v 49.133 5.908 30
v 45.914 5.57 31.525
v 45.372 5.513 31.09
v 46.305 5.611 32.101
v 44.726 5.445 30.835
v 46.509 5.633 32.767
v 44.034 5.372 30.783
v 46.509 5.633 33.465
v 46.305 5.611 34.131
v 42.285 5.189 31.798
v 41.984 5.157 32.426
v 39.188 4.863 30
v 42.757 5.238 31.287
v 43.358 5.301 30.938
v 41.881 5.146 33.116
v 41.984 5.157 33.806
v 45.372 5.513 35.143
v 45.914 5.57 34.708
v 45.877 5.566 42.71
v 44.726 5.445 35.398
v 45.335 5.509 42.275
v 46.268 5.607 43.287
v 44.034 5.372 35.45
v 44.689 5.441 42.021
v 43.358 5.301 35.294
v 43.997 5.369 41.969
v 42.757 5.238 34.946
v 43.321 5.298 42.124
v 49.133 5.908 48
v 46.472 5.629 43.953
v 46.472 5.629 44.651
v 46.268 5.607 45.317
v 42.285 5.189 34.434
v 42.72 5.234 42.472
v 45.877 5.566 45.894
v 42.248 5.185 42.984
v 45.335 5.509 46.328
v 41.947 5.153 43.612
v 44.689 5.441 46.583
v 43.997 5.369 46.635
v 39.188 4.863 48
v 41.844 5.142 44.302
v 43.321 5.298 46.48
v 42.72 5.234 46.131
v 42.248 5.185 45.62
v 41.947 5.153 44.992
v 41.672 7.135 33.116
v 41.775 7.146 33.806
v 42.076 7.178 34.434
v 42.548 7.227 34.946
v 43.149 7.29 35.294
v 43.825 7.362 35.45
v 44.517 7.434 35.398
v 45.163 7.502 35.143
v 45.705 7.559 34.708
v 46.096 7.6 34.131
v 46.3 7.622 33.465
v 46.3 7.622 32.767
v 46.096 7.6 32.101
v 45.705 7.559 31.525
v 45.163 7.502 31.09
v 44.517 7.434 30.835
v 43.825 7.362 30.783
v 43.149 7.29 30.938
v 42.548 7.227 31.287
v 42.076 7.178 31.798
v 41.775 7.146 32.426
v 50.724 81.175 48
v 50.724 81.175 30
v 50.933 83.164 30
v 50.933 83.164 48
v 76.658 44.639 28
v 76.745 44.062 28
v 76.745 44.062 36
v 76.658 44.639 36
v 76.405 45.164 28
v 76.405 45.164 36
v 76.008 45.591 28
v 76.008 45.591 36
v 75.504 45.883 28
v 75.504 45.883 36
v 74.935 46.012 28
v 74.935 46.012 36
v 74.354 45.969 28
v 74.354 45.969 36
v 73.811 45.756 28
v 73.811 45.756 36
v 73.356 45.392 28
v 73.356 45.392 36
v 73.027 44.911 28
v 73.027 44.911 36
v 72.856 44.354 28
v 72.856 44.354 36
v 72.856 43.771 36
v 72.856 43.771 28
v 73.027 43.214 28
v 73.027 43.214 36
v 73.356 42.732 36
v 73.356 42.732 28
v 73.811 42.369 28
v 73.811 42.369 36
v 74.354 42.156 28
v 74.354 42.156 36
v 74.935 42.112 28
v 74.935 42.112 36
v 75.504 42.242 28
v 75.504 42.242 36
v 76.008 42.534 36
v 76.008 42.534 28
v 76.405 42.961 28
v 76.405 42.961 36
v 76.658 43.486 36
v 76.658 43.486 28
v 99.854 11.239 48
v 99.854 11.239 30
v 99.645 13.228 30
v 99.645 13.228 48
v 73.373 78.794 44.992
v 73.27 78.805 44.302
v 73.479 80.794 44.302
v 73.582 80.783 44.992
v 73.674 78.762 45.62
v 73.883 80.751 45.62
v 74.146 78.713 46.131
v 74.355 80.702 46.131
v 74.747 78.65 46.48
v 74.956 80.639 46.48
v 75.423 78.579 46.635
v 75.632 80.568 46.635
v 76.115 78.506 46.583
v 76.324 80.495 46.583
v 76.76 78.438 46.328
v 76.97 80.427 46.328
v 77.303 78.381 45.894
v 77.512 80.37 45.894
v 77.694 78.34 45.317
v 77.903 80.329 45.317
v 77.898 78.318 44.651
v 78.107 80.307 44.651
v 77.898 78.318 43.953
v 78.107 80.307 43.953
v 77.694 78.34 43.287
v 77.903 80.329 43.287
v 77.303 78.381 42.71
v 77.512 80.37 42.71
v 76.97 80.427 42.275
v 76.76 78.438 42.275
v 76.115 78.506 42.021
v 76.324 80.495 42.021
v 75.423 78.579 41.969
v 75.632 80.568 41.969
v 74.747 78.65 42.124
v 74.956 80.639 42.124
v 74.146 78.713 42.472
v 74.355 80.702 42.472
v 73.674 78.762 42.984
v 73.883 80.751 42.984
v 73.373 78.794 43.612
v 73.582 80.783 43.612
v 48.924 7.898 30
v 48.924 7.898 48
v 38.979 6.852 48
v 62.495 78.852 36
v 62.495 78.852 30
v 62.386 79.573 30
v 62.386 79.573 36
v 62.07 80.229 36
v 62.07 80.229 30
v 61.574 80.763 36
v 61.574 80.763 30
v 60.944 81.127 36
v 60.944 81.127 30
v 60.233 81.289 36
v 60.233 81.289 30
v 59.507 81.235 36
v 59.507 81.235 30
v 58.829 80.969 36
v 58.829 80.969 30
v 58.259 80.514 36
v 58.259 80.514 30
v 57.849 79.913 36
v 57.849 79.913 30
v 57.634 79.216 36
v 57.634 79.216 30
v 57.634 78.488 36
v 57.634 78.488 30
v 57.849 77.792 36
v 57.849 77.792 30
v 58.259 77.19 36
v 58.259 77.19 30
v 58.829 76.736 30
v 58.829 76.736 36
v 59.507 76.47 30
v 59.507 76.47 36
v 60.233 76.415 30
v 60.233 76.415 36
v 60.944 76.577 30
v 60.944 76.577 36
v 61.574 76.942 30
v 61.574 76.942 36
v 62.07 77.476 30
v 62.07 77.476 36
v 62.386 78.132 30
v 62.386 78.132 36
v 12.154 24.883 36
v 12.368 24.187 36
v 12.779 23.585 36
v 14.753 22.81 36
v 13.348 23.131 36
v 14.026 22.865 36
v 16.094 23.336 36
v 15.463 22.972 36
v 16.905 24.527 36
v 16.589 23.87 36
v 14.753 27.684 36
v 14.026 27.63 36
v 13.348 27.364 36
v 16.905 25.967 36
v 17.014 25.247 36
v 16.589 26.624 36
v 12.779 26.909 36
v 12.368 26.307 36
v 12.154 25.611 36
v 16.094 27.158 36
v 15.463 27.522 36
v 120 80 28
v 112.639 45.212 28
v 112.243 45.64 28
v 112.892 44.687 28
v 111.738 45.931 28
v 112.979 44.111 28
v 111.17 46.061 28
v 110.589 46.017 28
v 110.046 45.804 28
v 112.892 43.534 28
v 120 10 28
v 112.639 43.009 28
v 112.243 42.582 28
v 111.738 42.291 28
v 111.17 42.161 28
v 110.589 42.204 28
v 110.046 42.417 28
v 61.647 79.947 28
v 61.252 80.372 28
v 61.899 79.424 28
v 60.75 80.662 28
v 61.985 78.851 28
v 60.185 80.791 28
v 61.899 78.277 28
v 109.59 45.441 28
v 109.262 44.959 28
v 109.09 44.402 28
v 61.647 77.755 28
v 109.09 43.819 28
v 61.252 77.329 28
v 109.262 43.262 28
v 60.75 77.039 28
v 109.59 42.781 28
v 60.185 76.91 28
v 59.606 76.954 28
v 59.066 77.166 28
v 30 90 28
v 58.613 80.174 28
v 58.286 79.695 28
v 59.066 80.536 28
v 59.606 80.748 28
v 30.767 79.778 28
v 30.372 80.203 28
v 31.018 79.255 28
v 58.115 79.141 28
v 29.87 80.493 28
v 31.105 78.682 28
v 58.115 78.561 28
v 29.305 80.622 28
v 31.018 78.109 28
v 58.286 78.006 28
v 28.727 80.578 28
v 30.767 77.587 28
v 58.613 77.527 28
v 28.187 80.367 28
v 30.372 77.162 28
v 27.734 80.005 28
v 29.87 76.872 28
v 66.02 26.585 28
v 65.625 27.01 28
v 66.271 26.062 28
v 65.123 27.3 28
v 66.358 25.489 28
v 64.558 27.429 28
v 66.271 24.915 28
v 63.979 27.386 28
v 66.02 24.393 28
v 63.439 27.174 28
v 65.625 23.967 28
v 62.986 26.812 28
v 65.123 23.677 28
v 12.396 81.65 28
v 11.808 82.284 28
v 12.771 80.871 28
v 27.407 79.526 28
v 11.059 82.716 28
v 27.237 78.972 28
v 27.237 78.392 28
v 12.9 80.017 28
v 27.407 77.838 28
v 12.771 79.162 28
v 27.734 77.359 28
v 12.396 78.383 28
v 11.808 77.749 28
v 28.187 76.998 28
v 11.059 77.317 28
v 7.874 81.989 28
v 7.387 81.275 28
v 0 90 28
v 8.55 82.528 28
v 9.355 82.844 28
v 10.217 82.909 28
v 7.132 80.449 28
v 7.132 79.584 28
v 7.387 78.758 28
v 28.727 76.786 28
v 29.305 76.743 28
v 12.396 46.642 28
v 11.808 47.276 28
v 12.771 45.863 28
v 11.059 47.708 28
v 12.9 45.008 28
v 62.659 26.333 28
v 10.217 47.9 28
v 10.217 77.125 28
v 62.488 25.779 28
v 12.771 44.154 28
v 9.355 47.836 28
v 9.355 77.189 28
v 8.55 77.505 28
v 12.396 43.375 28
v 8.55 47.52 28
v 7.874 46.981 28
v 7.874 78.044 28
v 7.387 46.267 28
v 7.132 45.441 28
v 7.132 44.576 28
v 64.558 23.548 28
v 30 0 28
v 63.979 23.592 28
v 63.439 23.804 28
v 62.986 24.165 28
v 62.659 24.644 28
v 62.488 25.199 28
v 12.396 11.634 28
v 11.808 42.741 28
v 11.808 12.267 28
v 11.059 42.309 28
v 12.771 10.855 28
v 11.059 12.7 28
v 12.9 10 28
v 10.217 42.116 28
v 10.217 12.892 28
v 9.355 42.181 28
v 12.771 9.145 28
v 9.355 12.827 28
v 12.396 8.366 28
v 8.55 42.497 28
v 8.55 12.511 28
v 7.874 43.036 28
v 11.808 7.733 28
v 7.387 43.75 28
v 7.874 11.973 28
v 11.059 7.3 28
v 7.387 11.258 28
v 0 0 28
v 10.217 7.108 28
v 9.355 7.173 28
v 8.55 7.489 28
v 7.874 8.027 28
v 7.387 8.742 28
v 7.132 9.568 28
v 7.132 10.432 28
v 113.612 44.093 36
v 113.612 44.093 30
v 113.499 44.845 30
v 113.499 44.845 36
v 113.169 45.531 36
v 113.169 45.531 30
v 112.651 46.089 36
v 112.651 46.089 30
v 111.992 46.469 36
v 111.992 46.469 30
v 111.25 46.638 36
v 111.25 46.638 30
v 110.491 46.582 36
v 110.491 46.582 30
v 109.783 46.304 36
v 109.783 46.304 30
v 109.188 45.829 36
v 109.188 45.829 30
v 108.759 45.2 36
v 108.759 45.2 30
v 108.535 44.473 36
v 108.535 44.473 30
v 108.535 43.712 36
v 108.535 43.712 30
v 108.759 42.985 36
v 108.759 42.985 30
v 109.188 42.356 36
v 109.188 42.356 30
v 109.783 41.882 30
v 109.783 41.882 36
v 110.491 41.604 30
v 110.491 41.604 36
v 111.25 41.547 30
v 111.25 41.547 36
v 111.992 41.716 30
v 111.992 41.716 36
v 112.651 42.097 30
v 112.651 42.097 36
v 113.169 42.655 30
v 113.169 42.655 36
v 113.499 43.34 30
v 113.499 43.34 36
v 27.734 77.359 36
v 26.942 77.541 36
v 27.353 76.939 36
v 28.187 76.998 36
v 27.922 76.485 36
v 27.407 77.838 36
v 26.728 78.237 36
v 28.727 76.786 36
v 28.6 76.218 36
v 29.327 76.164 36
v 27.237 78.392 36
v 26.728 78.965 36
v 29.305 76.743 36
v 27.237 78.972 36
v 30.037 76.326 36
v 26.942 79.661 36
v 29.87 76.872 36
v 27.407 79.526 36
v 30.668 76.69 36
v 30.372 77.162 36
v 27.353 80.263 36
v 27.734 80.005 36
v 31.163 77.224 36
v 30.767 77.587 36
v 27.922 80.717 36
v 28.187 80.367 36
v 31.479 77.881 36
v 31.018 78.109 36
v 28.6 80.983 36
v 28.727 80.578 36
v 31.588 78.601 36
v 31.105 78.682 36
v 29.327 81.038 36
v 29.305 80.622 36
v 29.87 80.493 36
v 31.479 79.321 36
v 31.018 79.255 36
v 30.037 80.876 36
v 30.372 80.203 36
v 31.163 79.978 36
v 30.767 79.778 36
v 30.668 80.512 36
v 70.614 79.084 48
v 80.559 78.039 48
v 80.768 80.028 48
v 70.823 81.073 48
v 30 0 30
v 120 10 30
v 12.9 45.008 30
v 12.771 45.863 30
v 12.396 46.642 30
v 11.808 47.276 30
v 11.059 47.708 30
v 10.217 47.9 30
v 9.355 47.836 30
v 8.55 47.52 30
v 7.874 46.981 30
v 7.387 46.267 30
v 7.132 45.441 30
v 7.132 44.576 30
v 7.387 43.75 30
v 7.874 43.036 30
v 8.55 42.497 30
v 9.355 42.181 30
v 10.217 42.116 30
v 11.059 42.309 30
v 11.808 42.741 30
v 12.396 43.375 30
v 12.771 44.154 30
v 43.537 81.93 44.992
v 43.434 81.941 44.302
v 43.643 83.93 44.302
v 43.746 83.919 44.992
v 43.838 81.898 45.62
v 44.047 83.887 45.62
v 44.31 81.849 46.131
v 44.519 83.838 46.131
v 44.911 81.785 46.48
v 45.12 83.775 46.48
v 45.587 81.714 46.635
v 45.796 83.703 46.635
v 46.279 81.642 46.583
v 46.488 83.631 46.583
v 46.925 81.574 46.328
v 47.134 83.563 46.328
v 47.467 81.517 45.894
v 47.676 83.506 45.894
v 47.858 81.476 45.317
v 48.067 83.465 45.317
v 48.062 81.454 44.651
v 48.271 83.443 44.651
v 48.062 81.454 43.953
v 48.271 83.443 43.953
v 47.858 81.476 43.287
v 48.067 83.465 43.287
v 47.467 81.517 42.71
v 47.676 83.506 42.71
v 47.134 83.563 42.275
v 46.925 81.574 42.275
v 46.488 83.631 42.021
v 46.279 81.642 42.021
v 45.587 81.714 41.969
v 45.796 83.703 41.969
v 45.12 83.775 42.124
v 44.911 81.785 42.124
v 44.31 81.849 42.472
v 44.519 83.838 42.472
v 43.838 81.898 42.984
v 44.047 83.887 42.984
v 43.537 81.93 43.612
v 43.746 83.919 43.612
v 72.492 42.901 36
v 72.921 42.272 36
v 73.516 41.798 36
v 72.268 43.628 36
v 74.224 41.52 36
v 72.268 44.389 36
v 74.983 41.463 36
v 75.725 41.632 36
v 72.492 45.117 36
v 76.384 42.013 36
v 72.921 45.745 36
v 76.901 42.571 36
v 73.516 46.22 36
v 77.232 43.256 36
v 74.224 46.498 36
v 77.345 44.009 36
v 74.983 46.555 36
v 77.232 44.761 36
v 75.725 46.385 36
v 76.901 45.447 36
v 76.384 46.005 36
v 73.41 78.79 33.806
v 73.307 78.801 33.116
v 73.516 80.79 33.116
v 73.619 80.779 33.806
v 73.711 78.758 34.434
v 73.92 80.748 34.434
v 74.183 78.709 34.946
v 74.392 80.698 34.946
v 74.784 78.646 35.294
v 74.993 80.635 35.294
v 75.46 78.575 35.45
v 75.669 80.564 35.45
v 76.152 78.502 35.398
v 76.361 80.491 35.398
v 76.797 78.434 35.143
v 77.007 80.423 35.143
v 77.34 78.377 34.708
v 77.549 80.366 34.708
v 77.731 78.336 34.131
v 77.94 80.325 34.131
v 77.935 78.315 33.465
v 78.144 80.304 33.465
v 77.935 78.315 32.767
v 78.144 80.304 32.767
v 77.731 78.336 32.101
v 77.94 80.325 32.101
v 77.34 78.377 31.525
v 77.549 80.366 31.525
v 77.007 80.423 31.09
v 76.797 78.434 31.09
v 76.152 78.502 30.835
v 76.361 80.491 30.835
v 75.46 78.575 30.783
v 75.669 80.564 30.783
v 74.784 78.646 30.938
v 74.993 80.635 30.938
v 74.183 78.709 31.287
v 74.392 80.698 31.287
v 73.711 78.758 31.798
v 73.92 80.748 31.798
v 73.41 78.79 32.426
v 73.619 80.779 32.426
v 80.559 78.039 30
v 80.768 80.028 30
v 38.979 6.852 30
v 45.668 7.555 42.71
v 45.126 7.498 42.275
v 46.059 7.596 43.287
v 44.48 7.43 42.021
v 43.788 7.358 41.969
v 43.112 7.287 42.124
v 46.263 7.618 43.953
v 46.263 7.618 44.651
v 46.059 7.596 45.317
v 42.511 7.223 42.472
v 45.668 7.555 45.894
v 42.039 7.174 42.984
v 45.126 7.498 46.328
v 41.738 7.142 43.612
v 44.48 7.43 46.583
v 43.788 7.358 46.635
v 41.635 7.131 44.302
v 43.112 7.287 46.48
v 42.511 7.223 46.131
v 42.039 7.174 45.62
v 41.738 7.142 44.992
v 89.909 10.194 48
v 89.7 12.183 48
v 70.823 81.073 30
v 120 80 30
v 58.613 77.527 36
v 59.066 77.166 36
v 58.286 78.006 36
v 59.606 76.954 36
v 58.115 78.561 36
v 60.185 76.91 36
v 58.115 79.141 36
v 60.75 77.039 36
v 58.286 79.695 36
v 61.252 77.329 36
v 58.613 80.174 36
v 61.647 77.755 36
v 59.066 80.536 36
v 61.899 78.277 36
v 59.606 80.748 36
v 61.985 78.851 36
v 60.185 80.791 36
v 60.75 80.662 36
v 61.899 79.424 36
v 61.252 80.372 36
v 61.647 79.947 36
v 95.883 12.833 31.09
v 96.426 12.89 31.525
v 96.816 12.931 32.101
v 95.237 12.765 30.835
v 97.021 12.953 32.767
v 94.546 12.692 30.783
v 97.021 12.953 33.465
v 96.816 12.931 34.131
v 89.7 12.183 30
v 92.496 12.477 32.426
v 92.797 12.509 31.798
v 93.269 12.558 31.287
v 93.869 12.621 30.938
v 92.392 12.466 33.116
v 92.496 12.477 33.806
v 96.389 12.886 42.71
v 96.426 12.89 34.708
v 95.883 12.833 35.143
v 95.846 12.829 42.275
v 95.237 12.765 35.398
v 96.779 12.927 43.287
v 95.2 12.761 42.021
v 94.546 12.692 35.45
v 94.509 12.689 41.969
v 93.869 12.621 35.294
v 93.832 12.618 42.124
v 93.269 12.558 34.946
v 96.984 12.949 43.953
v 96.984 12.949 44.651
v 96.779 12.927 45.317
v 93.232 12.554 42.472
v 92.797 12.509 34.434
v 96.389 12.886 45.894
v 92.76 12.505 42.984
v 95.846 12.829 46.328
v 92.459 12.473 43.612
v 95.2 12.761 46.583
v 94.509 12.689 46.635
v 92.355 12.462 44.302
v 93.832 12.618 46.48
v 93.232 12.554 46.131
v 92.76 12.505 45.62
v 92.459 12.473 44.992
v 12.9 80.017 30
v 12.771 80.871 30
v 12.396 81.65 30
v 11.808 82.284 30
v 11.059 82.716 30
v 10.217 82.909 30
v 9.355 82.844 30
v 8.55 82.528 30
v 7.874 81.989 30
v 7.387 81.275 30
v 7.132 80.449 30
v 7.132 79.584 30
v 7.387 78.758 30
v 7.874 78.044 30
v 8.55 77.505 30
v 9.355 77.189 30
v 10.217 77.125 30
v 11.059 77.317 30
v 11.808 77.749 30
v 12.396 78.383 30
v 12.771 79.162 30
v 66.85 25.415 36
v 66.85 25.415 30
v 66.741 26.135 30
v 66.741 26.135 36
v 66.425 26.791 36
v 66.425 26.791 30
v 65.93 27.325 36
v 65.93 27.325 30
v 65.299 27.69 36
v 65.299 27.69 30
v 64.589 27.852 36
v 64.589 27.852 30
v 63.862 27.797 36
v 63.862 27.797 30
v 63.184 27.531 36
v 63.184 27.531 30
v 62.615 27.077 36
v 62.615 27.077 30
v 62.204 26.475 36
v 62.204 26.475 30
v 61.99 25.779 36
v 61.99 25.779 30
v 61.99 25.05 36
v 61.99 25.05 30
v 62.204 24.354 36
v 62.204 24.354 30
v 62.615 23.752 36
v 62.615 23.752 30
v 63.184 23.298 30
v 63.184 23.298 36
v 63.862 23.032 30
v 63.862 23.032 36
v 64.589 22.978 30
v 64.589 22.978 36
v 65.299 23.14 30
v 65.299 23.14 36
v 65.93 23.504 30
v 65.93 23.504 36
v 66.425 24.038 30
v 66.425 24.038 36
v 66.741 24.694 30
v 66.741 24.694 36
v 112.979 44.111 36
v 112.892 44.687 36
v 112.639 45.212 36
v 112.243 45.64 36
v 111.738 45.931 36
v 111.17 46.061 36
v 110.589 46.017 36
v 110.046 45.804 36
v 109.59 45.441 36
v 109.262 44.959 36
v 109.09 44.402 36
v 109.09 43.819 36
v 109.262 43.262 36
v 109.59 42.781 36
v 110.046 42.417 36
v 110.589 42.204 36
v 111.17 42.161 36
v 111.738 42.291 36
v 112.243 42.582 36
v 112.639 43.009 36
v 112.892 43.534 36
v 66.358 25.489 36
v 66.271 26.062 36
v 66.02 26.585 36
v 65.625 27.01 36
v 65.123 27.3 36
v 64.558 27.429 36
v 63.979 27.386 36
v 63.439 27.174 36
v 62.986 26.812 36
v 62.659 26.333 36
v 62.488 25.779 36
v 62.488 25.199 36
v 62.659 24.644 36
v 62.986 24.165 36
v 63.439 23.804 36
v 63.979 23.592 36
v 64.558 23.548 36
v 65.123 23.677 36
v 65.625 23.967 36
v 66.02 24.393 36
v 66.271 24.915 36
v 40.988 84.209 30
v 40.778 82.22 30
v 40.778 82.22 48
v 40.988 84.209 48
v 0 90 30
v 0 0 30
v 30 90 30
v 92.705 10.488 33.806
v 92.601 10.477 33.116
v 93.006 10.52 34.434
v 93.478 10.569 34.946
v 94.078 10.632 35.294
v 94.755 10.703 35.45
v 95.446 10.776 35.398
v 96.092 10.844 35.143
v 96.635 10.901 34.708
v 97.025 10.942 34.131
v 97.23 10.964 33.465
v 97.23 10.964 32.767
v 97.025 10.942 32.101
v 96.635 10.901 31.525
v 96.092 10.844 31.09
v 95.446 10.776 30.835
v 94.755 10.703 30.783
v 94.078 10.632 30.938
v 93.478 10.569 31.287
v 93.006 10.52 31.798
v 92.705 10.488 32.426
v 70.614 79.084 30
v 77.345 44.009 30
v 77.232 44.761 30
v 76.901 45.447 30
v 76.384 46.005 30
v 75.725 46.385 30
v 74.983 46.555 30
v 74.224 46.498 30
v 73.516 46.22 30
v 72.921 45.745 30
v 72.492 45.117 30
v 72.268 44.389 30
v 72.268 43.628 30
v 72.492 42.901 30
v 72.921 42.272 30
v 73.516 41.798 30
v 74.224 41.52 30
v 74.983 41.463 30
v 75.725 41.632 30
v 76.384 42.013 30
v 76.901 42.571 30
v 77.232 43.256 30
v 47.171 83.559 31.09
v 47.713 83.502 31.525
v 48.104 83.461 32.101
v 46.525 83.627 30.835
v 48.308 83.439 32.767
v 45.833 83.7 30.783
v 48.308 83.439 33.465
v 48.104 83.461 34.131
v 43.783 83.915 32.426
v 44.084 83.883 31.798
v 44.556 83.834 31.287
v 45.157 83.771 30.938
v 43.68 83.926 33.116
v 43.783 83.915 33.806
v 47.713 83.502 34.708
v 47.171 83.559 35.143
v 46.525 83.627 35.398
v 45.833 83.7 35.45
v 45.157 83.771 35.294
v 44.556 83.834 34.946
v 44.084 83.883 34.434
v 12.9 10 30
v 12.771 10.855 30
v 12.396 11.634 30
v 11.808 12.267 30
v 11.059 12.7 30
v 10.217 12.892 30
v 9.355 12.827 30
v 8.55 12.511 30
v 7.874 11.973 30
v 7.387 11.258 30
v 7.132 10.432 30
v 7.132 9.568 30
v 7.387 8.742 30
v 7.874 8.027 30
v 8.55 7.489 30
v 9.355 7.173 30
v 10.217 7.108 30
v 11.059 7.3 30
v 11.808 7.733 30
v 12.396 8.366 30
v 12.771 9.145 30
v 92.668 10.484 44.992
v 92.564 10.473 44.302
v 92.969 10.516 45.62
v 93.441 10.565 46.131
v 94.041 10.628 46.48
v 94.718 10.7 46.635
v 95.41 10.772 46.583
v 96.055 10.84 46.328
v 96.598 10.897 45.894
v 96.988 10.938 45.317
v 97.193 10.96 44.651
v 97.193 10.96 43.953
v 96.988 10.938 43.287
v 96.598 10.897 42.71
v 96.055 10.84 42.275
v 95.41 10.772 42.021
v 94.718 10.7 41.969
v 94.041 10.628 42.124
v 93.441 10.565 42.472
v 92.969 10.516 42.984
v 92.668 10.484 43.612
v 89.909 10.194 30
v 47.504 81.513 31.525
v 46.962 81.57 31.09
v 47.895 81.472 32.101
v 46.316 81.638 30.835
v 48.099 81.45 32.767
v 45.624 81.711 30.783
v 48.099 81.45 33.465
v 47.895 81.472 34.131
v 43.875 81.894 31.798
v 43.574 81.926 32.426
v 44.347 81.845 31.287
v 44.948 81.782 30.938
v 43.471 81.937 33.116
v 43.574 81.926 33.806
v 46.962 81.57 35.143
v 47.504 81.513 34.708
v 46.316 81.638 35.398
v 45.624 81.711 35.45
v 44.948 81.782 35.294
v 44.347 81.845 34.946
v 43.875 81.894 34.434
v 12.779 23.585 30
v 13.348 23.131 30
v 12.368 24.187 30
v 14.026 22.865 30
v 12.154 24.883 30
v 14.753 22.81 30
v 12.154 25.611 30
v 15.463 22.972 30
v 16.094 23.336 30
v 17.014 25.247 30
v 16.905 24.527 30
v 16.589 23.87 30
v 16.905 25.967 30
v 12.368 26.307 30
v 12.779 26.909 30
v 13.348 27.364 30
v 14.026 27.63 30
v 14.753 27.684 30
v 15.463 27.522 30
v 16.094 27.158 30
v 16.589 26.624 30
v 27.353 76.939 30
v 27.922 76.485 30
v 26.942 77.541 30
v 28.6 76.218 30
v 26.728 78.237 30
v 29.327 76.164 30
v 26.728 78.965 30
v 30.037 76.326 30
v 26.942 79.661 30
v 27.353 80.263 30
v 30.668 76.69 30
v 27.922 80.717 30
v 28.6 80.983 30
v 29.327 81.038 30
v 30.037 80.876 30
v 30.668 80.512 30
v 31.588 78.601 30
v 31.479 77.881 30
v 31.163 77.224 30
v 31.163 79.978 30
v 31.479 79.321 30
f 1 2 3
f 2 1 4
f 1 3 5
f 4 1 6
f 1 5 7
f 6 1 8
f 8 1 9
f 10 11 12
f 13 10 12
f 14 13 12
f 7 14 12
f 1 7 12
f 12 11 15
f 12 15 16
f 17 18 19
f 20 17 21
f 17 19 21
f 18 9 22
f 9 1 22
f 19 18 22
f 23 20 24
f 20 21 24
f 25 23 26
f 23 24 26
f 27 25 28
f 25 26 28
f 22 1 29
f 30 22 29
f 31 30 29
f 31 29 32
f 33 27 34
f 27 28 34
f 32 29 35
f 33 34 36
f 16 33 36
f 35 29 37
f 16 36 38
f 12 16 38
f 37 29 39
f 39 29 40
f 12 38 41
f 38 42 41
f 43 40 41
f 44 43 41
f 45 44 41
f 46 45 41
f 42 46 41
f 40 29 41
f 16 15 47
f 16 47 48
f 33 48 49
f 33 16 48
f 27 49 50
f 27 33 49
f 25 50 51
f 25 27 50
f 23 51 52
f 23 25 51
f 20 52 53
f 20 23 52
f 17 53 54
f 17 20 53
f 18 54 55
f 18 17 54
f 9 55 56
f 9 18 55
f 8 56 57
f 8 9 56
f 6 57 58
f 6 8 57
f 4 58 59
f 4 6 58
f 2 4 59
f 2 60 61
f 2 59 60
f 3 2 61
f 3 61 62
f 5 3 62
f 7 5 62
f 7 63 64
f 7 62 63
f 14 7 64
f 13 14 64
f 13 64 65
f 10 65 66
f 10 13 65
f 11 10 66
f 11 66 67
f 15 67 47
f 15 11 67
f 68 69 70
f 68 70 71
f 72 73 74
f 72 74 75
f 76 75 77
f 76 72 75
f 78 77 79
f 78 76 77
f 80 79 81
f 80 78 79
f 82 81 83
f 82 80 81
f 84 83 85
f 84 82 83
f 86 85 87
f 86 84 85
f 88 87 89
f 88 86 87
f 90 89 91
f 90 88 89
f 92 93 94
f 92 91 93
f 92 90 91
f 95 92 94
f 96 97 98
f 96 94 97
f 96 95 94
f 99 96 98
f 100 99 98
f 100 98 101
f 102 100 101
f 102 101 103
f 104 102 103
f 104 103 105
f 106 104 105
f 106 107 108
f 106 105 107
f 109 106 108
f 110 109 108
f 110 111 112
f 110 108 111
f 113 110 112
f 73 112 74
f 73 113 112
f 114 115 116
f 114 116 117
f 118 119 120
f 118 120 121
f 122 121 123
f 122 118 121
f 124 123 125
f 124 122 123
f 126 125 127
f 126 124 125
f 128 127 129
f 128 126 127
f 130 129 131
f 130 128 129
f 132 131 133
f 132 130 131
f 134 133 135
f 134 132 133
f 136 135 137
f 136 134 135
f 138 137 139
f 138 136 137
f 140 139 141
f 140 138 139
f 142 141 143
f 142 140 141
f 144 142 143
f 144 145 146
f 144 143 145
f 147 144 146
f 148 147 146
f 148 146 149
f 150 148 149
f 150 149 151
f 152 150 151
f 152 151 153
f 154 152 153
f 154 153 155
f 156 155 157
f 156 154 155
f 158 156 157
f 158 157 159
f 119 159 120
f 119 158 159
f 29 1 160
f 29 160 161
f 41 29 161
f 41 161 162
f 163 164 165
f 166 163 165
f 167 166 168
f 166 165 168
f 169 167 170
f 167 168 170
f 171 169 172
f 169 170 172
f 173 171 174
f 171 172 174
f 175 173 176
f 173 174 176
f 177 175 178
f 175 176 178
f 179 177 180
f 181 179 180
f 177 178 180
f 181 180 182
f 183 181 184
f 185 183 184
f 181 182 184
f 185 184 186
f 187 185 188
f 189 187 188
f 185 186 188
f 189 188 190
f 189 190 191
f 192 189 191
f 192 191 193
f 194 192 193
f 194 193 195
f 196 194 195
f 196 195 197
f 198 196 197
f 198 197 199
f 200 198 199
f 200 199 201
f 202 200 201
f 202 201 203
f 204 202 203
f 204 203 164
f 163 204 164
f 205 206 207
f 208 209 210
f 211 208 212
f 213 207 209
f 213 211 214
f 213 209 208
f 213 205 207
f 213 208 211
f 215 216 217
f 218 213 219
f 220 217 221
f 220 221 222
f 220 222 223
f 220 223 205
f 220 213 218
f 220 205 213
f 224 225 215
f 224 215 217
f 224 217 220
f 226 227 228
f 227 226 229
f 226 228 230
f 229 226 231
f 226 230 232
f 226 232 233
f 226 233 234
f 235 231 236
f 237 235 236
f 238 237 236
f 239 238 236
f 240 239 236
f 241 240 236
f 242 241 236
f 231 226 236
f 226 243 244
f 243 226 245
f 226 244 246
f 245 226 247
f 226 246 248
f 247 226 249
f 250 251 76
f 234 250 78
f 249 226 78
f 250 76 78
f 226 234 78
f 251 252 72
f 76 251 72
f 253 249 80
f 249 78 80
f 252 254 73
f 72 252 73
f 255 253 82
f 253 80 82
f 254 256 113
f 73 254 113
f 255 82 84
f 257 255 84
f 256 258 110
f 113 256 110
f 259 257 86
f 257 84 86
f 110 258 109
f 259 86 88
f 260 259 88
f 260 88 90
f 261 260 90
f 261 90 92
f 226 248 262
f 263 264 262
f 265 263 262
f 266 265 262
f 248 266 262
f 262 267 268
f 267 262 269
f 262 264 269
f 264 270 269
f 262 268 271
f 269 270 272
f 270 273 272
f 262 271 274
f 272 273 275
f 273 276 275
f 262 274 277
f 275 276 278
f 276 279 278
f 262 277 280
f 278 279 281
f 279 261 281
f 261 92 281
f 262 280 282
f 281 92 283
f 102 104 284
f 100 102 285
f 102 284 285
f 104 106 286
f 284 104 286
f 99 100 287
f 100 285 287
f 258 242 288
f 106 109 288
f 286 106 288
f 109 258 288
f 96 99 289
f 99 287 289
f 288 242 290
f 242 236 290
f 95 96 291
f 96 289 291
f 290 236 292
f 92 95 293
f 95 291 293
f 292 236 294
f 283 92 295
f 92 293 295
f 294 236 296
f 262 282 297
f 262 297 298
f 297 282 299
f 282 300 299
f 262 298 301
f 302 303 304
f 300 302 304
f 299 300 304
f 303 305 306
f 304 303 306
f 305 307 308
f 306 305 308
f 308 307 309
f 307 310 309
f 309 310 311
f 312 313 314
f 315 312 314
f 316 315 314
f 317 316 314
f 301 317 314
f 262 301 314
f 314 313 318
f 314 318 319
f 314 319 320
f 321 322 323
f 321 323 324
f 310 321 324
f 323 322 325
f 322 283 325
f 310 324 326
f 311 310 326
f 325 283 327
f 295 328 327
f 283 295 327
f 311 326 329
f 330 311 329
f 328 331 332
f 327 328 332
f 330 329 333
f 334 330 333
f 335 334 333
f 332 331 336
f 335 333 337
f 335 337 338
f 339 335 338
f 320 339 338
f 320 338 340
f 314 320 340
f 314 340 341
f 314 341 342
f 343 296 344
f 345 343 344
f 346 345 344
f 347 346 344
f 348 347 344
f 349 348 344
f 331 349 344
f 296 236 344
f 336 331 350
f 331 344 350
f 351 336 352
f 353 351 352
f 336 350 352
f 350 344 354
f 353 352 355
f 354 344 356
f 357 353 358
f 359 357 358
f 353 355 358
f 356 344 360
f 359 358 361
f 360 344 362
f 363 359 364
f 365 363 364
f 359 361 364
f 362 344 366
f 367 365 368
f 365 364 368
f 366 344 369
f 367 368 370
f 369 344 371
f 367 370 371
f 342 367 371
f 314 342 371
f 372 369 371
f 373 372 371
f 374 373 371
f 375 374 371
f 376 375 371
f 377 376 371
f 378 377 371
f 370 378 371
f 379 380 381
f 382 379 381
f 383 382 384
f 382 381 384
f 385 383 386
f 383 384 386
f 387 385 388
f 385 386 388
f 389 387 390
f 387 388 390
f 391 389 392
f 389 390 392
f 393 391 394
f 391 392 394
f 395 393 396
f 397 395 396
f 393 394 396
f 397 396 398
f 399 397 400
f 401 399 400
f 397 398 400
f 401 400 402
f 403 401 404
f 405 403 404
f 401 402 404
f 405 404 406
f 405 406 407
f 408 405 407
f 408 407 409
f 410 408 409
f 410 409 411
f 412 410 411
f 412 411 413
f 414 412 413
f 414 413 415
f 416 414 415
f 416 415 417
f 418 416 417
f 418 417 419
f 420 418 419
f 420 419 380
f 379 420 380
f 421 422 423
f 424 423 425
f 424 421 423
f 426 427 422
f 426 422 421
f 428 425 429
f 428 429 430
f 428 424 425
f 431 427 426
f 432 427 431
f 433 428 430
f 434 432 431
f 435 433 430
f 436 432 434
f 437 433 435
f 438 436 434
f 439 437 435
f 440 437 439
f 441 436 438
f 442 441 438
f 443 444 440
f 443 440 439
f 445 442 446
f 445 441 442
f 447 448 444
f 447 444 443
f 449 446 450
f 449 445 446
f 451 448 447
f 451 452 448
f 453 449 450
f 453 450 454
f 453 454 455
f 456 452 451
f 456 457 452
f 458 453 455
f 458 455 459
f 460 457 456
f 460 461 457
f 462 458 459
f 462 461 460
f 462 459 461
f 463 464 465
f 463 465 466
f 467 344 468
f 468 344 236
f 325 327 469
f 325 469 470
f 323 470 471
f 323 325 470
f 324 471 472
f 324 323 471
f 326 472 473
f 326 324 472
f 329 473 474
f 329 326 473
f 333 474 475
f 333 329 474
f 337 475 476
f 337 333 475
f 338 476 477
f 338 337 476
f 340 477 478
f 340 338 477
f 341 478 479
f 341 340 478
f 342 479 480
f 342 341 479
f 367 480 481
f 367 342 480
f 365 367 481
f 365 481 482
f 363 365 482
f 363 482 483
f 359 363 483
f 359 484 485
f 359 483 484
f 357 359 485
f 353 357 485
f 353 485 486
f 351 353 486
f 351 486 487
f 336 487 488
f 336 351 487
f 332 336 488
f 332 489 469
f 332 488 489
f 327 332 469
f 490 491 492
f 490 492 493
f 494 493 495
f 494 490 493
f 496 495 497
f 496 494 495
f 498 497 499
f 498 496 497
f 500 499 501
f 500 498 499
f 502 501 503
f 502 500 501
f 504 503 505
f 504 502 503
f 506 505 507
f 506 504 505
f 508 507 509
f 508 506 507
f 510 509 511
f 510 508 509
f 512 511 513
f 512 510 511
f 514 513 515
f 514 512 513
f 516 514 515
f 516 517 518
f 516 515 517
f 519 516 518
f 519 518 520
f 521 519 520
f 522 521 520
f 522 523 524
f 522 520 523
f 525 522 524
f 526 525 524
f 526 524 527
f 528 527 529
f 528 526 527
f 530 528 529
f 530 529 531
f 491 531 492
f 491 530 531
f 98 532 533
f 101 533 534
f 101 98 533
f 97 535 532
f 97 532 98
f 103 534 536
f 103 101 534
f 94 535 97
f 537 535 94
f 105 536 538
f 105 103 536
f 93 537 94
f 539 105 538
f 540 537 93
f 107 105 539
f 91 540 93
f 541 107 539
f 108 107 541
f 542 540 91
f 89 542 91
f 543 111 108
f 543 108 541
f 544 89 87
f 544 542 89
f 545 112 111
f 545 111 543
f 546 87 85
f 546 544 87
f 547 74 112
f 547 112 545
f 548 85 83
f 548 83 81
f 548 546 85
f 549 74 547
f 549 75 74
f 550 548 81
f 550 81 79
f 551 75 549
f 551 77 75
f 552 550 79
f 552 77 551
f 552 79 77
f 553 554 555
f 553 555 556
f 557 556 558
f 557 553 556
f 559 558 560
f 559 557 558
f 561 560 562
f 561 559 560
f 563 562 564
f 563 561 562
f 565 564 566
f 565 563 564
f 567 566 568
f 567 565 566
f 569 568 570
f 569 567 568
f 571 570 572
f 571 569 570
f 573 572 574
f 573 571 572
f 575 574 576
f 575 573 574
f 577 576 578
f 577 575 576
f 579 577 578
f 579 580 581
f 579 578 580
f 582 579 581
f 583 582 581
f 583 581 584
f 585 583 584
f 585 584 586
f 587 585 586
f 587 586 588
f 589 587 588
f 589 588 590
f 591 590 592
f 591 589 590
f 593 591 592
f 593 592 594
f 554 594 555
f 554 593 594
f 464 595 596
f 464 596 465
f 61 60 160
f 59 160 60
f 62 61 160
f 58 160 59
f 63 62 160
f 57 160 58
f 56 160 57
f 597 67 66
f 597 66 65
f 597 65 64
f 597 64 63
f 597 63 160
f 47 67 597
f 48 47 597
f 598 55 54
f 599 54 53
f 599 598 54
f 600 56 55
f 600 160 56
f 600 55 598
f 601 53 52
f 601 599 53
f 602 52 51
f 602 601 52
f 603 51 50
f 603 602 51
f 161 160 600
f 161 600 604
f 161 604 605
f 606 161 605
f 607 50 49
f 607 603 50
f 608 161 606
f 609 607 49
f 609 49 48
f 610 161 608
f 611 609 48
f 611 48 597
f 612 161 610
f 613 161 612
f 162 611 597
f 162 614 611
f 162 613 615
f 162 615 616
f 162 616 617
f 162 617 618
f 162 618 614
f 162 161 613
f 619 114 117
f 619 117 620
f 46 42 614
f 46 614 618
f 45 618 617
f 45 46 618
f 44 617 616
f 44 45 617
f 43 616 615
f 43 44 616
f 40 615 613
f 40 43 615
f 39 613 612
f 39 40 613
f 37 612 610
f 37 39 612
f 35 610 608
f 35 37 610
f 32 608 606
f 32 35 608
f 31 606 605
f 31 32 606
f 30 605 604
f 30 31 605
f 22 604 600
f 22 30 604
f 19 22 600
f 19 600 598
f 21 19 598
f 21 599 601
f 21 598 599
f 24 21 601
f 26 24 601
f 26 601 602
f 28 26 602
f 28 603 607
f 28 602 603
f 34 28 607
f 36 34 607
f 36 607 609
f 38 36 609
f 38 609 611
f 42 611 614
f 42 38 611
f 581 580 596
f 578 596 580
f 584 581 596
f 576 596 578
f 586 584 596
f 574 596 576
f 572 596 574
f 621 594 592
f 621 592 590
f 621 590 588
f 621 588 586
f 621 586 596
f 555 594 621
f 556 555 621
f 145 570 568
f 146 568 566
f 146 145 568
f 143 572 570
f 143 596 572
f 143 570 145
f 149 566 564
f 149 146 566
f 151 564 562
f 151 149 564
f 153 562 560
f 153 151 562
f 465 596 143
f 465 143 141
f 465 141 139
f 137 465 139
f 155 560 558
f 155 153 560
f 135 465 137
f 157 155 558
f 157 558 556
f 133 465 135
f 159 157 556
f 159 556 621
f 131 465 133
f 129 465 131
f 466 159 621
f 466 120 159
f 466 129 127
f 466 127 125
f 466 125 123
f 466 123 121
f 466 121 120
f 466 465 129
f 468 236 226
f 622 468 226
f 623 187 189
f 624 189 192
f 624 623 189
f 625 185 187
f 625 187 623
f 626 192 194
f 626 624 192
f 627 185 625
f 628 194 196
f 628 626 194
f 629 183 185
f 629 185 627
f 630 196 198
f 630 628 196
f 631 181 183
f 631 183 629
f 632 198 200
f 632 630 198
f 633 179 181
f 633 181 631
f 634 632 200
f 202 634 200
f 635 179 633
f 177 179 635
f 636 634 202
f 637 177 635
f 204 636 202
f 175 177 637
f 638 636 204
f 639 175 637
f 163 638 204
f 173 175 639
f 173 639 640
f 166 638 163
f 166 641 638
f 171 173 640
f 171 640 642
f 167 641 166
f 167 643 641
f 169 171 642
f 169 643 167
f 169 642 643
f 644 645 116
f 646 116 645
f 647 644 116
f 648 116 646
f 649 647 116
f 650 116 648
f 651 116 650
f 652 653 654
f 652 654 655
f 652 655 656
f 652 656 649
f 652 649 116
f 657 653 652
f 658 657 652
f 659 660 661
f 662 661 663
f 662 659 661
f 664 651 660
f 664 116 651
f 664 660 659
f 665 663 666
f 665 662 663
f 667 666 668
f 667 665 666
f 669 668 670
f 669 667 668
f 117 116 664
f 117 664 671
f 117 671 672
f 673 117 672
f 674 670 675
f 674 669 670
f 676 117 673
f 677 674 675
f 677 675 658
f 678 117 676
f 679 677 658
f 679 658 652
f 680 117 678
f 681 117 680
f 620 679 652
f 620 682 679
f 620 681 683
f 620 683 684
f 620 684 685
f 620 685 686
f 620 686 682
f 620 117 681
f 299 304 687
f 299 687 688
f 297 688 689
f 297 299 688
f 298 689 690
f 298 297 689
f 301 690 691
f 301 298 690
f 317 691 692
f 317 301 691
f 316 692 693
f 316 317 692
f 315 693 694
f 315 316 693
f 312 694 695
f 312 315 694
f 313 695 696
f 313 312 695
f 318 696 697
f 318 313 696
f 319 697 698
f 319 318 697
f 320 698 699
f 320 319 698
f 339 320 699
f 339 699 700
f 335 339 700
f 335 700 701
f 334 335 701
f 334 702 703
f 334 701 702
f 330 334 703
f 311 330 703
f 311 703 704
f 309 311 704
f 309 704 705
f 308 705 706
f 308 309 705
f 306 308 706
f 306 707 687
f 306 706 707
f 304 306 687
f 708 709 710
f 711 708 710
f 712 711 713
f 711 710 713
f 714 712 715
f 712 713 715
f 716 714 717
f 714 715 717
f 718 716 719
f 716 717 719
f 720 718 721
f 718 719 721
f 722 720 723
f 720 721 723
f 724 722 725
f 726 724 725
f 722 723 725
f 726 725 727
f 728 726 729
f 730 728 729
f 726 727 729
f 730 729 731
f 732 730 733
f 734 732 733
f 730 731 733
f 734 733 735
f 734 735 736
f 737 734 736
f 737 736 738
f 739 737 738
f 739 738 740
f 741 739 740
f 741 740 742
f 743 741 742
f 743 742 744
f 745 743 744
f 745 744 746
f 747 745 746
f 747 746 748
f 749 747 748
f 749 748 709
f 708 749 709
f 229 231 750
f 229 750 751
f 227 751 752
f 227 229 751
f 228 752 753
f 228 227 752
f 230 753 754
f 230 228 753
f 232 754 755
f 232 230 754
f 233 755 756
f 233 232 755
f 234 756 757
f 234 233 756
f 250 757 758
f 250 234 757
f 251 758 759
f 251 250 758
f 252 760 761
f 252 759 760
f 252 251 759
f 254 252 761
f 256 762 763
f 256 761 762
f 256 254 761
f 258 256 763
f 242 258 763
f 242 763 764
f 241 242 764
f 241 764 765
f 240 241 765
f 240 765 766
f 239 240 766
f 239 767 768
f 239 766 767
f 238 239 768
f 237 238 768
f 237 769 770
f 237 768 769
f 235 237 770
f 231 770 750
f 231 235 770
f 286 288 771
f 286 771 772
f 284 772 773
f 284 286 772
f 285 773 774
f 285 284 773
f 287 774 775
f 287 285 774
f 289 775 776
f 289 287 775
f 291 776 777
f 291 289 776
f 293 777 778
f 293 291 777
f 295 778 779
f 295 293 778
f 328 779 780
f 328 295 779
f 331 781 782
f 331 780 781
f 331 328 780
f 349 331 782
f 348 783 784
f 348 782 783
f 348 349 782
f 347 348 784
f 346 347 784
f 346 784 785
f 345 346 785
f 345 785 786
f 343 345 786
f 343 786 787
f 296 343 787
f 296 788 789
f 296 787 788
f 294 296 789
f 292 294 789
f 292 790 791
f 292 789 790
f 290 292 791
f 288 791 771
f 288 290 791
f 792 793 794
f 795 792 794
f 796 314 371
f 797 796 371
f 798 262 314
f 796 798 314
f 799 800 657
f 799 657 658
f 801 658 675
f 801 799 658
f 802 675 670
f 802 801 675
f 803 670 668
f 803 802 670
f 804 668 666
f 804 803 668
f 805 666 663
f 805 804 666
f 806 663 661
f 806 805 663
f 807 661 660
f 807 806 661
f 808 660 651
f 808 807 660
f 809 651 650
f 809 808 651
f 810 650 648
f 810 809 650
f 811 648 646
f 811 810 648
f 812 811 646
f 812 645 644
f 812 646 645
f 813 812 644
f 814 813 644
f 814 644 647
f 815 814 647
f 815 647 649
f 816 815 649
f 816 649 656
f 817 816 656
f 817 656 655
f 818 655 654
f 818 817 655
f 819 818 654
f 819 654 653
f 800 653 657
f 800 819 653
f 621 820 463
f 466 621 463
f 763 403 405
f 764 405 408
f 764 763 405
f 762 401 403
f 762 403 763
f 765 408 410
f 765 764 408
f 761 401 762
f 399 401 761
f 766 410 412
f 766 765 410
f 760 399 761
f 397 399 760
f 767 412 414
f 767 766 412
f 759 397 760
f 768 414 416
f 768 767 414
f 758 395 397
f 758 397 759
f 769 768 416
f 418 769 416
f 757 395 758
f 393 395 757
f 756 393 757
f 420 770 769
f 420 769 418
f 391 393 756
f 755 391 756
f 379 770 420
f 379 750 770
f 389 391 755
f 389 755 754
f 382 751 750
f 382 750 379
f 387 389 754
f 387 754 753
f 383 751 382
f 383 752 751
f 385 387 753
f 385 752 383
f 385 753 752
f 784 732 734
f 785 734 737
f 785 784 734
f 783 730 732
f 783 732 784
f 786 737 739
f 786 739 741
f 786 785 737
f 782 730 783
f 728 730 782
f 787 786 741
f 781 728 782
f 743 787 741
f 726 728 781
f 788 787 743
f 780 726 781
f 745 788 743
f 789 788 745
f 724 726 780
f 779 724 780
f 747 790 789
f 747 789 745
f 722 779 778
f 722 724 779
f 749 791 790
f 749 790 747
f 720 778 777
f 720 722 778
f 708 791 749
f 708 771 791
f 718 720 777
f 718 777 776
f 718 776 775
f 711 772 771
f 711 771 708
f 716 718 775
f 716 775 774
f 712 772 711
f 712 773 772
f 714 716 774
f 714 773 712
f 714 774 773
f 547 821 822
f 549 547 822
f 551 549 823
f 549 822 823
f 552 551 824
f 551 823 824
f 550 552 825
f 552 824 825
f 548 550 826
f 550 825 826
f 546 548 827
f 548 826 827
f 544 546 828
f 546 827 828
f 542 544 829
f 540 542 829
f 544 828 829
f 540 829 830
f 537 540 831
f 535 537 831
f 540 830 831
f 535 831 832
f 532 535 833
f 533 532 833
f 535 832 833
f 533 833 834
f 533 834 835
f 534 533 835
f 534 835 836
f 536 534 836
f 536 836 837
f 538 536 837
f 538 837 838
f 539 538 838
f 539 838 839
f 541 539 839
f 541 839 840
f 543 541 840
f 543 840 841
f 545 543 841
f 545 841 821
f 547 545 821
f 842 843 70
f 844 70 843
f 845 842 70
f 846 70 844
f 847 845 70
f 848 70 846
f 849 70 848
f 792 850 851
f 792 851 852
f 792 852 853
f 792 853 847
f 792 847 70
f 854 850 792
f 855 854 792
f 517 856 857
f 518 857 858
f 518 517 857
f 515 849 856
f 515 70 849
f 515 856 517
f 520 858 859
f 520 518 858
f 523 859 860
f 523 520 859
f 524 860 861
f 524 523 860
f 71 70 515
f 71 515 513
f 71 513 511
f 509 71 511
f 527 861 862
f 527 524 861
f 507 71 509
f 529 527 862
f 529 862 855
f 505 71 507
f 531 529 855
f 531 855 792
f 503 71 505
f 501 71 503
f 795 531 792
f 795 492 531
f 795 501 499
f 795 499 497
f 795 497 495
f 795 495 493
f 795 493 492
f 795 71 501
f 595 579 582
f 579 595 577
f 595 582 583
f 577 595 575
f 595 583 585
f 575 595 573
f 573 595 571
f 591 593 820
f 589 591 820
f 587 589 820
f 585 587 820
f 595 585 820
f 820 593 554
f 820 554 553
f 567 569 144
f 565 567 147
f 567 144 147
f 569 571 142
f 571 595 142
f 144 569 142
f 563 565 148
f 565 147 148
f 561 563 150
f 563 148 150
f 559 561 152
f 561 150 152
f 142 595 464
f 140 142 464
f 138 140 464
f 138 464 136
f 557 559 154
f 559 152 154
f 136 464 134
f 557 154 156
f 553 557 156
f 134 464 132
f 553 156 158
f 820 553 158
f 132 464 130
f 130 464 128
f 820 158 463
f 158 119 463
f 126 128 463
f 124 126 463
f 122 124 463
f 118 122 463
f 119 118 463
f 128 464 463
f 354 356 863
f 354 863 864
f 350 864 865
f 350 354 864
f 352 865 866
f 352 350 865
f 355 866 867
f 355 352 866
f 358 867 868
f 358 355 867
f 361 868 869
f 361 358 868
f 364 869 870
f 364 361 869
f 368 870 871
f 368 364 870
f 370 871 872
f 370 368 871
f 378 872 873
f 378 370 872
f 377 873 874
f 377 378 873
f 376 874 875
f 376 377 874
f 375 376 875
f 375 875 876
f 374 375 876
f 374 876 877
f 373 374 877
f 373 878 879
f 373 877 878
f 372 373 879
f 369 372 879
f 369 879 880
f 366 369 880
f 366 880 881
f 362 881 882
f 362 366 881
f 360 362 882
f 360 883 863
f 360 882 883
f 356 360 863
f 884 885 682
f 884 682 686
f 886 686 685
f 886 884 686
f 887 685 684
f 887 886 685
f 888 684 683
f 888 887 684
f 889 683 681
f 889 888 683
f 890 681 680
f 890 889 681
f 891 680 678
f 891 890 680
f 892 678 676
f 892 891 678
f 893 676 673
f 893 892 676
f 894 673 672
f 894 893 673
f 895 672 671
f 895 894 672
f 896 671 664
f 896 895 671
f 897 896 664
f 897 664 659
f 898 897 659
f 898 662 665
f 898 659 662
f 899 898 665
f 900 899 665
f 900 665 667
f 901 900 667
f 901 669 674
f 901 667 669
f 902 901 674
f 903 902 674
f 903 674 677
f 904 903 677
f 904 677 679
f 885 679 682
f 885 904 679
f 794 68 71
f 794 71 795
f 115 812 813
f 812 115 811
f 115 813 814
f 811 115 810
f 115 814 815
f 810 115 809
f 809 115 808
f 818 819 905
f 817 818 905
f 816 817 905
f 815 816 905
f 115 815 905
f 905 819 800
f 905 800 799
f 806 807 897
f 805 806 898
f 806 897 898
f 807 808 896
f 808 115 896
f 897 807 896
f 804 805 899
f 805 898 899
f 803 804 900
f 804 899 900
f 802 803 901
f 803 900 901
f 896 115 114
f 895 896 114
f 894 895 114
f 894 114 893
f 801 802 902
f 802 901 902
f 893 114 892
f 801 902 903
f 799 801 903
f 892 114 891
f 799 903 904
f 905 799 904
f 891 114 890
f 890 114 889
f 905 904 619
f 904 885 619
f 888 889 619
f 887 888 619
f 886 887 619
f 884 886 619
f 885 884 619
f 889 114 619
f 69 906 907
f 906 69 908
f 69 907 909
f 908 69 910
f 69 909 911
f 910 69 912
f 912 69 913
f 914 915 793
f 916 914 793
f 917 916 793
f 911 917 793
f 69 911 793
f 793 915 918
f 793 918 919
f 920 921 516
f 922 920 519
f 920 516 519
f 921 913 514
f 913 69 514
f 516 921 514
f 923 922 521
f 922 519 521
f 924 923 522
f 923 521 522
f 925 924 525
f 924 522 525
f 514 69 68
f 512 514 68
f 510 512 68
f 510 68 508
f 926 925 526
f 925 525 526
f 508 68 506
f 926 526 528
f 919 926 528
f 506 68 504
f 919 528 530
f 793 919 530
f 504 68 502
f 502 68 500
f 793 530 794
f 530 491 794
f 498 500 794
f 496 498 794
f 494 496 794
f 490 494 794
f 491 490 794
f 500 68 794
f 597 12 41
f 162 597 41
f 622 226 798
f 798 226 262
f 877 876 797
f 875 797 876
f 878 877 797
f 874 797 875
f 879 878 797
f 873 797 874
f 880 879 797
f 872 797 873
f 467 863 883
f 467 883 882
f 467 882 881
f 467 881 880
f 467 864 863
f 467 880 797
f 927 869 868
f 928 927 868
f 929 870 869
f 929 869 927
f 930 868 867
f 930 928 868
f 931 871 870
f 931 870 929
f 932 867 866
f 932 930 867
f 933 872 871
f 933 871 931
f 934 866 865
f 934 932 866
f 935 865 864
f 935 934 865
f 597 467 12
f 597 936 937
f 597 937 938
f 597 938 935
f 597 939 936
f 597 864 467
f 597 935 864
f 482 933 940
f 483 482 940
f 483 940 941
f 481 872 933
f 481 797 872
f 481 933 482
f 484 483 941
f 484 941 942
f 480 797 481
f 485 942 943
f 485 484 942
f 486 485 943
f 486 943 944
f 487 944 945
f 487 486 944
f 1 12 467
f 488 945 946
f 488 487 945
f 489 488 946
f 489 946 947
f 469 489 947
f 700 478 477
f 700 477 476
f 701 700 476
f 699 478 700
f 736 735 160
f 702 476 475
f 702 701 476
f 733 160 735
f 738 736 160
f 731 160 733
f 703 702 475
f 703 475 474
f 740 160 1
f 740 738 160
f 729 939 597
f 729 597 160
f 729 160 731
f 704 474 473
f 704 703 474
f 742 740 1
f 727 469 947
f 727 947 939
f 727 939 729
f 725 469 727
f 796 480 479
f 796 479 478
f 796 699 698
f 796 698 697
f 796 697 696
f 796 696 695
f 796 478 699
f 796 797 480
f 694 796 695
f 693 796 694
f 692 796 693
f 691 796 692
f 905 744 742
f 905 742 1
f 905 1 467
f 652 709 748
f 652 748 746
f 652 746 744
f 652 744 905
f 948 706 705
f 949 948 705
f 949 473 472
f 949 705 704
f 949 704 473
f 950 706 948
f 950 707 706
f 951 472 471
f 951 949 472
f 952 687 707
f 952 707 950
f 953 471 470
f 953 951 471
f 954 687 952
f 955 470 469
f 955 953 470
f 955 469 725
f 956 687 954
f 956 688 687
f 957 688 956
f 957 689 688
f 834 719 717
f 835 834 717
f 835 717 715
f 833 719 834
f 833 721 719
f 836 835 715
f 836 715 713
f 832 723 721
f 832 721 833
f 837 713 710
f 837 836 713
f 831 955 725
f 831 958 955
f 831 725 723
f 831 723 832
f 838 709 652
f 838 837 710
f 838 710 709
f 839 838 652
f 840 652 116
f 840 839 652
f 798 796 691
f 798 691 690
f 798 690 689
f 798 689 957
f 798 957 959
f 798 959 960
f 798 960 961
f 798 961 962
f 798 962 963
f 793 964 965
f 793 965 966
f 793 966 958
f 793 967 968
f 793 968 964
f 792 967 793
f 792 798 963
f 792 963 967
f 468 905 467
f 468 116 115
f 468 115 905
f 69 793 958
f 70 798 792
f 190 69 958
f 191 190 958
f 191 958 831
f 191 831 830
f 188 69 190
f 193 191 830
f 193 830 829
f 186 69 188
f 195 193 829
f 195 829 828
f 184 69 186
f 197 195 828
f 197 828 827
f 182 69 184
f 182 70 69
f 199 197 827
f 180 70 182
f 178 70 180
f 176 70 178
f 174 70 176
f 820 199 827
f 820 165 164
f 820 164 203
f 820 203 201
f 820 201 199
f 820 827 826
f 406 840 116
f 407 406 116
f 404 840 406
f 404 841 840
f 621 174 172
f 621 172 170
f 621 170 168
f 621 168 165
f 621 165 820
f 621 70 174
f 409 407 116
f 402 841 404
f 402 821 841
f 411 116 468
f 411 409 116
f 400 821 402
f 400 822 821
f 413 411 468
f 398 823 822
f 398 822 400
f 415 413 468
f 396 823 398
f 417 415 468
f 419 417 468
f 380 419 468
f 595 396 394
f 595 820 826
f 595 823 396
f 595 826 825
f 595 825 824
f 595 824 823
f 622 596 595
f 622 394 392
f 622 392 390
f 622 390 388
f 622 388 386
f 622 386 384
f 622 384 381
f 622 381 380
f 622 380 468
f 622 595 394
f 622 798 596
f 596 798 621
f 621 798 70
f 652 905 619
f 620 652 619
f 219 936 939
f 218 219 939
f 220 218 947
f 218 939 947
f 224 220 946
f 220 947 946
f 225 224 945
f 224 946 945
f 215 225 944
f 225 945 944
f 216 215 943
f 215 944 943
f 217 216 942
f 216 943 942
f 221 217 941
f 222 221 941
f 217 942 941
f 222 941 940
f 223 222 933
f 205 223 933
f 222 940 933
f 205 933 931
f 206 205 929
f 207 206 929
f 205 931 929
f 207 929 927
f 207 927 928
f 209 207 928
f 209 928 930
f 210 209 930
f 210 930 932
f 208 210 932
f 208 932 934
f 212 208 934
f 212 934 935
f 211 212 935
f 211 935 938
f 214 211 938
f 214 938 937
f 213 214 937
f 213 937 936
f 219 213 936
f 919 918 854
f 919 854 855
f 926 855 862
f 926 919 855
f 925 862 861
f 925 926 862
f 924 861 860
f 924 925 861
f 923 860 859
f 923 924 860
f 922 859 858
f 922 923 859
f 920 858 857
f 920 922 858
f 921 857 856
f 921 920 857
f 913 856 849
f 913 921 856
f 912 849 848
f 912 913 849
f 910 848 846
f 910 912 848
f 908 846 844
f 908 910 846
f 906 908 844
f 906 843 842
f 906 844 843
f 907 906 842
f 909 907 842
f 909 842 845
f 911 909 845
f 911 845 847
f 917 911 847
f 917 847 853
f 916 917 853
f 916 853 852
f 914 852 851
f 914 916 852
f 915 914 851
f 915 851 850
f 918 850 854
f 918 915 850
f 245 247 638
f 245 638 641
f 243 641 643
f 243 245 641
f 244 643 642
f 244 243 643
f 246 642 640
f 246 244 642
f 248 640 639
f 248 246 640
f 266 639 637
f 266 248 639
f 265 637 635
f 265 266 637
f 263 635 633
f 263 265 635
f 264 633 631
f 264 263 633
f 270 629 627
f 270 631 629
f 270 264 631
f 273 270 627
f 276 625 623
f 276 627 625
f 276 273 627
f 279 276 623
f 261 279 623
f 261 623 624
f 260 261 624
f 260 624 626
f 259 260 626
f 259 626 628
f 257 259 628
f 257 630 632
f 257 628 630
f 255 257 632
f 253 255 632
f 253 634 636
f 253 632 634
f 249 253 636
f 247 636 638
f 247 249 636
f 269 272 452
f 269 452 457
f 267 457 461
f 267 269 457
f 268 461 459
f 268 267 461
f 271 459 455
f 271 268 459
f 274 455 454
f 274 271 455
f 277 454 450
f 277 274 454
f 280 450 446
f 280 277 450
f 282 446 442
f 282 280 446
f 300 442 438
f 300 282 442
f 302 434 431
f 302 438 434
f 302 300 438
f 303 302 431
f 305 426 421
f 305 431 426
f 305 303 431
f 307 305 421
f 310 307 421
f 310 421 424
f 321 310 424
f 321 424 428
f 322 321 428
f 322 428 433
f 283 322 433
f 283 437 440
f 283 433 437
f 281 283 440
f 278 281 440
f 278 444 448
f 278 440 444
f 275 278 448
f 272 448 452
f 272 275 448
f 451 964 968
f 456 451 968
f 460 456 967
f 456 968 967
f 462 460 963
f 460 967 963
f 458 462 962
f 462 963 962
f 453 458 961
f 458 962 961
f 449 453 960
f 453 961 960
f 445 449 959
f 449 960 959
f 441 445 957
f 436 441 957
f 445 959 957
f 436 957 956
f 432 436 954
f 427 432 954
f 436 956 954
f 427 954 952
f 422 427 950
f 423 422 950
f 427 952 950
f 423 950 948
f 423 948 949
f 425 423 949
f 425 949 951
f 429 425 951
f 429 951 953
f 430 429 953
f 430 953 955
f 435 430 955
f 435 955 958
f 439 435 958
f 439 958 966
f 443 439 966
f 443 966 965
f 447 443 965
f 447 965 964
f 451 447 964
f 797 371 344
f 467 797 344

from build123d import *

# Parameters (mm, degrees)
SKETCH048_R                = 2.34
EXTRUDE050_DEPTH           = 20
SKETCH047_W                = 10
SKETCH047_H                = 20
EXTRUDE049_DEPTH           = 2
EXTRUDE049_PLACEMENT_ANGLE = 90
CUT121_PLACEMENT_ANGLE     = 96
CUT120_PLACEMENT_ANGLE     = 96
CUT119_PLACEMENT_ANGLE     = 84
CUT118_PLACEMENT_ANGLE     = 84
SKETCH018_R                = 1.955414
SKETCH018_R_2              = 1.945
SKETCH018_R_3              = 1.945712
EXTRUDE054_DEPTH           = 30
SKETCH017_R                = 2.552893
SKETCH017_R_2              = 2.443798
EXTRUDE192_DEPTH           = 7
SKETCH003_R                = 2.9
EXTRUDE052_DEPTH           = 50
EXTRUDE191_DEPTH           = 2


with BuildPart() as tornillos010:
    # Sketch048 (on Face6 of Extrude049) → Extrude050 (new body)
    with BuildSketch(Plane(origin=(-98, -107, 0), x_dir=(0, -1, 0), z_dir=(-1, 0, 0))):
        with Locations((-135.010223, 26.301971)):
            Circle(SKETCH048_R)
        with Locations((-135.047425, 15.116198)):
            Circle(SKETCH048_R)
    extrude(amount=EXTRUDE050_DEPTH)


with BuildPart() as tornillos010_1:
    # Extrude050 placement: moved
    add(tornillos010.part.moved(Location((17, 0, 0))))


with BuildPart() as soporte008:
    # Sketch047 → Extrude049 (new body)
    with BuildSketch(Plane.XZ):
        with Locations((-135, 20)):
            Rectangle(SKETCH047_W, SKETCH047_H)
    extrude(amount=EXTRUDE049_DEPTH)


with BuildPart() as soporte008_1:
    # Extrude049 placement: moved
    add(soporte008.part.moved(Location((-96, -107, 0))).rotate(Axis((-96, -107, 0), (0, 0, -1)), EXTRUDE049_PLACEMENT_ANGLE))


with BuildPart() as soporte024:
    # Cut121 base: copy of Soporte008
    add(soporte008_1.part)

    # Cut121: cut Tornillos010
    add(tornillos010_1.part, mode=Mode.SUBTRACT)


with BuildPart() as soporte024_1:
    # Cut121 placement: moved
    add(soporte024.part.moved(Location((7.869711, -10.850119, 18))).rotate(Axis((7.869711, -10.850119, 18), (0, 0, -1)), CUT121_PLACEMENT_ANGLE))


with BuildPart() as soporte023:
    # Cut120 base: copy of Soporte008
    add(soporte008_1.part)

    # Cut120: cut Tornillos010
    add(tornillos010_1.part, mode=Mode.SUBTRACT)


with BuildPart() as soporte023_1:
    # Cut120 placement: moved
    add(soporte023.part.moved(Location((37.705367, -13.985973, 18))).rotate(Axis((37.705367, -13.985973, 18), (0, 0, -1)), CUT120_PLACEMENT_ANGLE))


with BuildPart() as soporte022:
    # Cut119 base: copy of Soporte008
    add(soporte008_1.part)

    # Cut119: cut Tornillos010
    add(tornillos010_1.part, mode=Mode.SUBTRACT)


with BuildPart() as soporte022_1:
    # Cut119 placement: moved
    add(soporte022.part.moved(Location((26.348989, -93.015079, 18))).rotate(Axis((26.348989, -93.015079, 18), (0, 0, -1)), CUT119_PLACEMENT_ANGLE))


with BuildPart() as soporte021:
    # Cut118 base: copy of Soporte008
    add(soporte008_1.part)

    # Cut118: cut Tornillos010
    add(tornillos010_1.part, mode=Mode.SUBTRACT)


with BuildPart() as soporte021_1:
    # Cut118 placement: moved
    add(soporte021.part.moved(Location((77.069606, -87.684127, 18))).rotate(Axis((77.069606, -87.684127, 18), (0, 0, -1)), CUT118_PLACEMENT_ANGLE))


with BuildPart() as extrude054:
    # Sketch018 → Extrude054 (new body)
    with BuildSketch(Plane.XY.offset(36)):
        with Locations((74.789169, 44.062363)):
            Circle(SKETCH018_R)
        with Locations((111.023758, 44.110783)):
            Circle(SKETCH018_R)
        with Locations((29.159777, 78.682182)):
            Circle(SKETCH018_R_2)
        with Locations((60.039303, 78.850616)):
            Circle(SKETCH018_R_3)
        with Locations((64.412148, 25.488655)):
            Circle(SKETCH018_R_3)
    extrude(amount=EXTRUDE054_DEPTH)


with BuildPart() as extrude054_1:
    # Extrude054 placement: moved
    add(extrude054.part.moved(Location((0, 0, -22))))


with BuildPart() as base_tornillos001:
    # Sketch017 → Extrude192 (new body)
    with BuildSketch(Plane.XY.offset(30)):
        with Locations((74.792107, 44.0089)):
            Circle(SKETCH017_R)
        with Locations((111.059273, 44.092655)):
            Circle(SKETCH017_R)
        with Locations((60.050713, 78.85218)):
            Circle(SKETCH017_R_2)
        with Locations((29.144051, 78.600906)):
            Circle(SKETCH017_R_2)
        with Locations((14.570175, 25.247131)):
            Circle(SKETCH017_R_2)
        with Locations((64.40612, 25.414646)):
            Circle(SKETCH017_R_2)
    extrude(amount=EXTRUDE192_DEPTH)


with BuildPart() as base_tornillos001_1:
    # Extrude192 placement: moved
    add(base_tornillos001.part.moved(Location((0, 0, -1))))


with BuildPart() as tornillos053:
    # Sketch003 → Extrude052 (new body)
    with BuildSketch(Plane.XY.offset(10)):
        with Locations((10, 80.016689)):
            Circle(SKETCH003_R)
        with Locations((10, 45.008344)):
            Circle(SKETCH003_R)
        with Locations((10, 10)):
            Circle(SKETCH003_R)
    extrude(amount=EXTRUDE052_DEPTH)


with BuildPart() as tornillos053_1:
    # Extrude052 placement: moved
    add(tornillos053.part.moved(Location((0, 0, -21))))


with BuildPart() as base_imprimir:
    # Sketch173 → Extrude191 (new body)
    with BuildSketch(Plane.XY):
        Polygon((0, 0), (30, 0), (120, 10), (120, 80), (30, 90), (0, 90), align=None)
    extrude(amount=EXTRUDE191_DEPTH)


with BuildPart() as base_imprimir_1:
    # Extrude191 placement: moved
    add(base_imprimir.part.moved(Location((0, 0, 28))))

    # Cut116: cut Tornillos053
    add(tornillos053_1.part, mode=Mode.SUBTRACT)

    # Fusion063: union Base tornillos001
    add(base_tornillos001_1.part)

    # Cut117: cut Extrude054
    add(extrude054_1.part, mode=Mode.SUBTRACT)

    # Fusion015: union Soporte021
    add(soporte021_1.part)

    # Fusion016: union Soporte022
    add(soporte022_1.part)

    # Fusion017: union Soporte023
    add(soporte023_1.part)

    # Fusion064: union Soporte024
    add(soporte024_1.part)


solid = base_imprimir_1.part
